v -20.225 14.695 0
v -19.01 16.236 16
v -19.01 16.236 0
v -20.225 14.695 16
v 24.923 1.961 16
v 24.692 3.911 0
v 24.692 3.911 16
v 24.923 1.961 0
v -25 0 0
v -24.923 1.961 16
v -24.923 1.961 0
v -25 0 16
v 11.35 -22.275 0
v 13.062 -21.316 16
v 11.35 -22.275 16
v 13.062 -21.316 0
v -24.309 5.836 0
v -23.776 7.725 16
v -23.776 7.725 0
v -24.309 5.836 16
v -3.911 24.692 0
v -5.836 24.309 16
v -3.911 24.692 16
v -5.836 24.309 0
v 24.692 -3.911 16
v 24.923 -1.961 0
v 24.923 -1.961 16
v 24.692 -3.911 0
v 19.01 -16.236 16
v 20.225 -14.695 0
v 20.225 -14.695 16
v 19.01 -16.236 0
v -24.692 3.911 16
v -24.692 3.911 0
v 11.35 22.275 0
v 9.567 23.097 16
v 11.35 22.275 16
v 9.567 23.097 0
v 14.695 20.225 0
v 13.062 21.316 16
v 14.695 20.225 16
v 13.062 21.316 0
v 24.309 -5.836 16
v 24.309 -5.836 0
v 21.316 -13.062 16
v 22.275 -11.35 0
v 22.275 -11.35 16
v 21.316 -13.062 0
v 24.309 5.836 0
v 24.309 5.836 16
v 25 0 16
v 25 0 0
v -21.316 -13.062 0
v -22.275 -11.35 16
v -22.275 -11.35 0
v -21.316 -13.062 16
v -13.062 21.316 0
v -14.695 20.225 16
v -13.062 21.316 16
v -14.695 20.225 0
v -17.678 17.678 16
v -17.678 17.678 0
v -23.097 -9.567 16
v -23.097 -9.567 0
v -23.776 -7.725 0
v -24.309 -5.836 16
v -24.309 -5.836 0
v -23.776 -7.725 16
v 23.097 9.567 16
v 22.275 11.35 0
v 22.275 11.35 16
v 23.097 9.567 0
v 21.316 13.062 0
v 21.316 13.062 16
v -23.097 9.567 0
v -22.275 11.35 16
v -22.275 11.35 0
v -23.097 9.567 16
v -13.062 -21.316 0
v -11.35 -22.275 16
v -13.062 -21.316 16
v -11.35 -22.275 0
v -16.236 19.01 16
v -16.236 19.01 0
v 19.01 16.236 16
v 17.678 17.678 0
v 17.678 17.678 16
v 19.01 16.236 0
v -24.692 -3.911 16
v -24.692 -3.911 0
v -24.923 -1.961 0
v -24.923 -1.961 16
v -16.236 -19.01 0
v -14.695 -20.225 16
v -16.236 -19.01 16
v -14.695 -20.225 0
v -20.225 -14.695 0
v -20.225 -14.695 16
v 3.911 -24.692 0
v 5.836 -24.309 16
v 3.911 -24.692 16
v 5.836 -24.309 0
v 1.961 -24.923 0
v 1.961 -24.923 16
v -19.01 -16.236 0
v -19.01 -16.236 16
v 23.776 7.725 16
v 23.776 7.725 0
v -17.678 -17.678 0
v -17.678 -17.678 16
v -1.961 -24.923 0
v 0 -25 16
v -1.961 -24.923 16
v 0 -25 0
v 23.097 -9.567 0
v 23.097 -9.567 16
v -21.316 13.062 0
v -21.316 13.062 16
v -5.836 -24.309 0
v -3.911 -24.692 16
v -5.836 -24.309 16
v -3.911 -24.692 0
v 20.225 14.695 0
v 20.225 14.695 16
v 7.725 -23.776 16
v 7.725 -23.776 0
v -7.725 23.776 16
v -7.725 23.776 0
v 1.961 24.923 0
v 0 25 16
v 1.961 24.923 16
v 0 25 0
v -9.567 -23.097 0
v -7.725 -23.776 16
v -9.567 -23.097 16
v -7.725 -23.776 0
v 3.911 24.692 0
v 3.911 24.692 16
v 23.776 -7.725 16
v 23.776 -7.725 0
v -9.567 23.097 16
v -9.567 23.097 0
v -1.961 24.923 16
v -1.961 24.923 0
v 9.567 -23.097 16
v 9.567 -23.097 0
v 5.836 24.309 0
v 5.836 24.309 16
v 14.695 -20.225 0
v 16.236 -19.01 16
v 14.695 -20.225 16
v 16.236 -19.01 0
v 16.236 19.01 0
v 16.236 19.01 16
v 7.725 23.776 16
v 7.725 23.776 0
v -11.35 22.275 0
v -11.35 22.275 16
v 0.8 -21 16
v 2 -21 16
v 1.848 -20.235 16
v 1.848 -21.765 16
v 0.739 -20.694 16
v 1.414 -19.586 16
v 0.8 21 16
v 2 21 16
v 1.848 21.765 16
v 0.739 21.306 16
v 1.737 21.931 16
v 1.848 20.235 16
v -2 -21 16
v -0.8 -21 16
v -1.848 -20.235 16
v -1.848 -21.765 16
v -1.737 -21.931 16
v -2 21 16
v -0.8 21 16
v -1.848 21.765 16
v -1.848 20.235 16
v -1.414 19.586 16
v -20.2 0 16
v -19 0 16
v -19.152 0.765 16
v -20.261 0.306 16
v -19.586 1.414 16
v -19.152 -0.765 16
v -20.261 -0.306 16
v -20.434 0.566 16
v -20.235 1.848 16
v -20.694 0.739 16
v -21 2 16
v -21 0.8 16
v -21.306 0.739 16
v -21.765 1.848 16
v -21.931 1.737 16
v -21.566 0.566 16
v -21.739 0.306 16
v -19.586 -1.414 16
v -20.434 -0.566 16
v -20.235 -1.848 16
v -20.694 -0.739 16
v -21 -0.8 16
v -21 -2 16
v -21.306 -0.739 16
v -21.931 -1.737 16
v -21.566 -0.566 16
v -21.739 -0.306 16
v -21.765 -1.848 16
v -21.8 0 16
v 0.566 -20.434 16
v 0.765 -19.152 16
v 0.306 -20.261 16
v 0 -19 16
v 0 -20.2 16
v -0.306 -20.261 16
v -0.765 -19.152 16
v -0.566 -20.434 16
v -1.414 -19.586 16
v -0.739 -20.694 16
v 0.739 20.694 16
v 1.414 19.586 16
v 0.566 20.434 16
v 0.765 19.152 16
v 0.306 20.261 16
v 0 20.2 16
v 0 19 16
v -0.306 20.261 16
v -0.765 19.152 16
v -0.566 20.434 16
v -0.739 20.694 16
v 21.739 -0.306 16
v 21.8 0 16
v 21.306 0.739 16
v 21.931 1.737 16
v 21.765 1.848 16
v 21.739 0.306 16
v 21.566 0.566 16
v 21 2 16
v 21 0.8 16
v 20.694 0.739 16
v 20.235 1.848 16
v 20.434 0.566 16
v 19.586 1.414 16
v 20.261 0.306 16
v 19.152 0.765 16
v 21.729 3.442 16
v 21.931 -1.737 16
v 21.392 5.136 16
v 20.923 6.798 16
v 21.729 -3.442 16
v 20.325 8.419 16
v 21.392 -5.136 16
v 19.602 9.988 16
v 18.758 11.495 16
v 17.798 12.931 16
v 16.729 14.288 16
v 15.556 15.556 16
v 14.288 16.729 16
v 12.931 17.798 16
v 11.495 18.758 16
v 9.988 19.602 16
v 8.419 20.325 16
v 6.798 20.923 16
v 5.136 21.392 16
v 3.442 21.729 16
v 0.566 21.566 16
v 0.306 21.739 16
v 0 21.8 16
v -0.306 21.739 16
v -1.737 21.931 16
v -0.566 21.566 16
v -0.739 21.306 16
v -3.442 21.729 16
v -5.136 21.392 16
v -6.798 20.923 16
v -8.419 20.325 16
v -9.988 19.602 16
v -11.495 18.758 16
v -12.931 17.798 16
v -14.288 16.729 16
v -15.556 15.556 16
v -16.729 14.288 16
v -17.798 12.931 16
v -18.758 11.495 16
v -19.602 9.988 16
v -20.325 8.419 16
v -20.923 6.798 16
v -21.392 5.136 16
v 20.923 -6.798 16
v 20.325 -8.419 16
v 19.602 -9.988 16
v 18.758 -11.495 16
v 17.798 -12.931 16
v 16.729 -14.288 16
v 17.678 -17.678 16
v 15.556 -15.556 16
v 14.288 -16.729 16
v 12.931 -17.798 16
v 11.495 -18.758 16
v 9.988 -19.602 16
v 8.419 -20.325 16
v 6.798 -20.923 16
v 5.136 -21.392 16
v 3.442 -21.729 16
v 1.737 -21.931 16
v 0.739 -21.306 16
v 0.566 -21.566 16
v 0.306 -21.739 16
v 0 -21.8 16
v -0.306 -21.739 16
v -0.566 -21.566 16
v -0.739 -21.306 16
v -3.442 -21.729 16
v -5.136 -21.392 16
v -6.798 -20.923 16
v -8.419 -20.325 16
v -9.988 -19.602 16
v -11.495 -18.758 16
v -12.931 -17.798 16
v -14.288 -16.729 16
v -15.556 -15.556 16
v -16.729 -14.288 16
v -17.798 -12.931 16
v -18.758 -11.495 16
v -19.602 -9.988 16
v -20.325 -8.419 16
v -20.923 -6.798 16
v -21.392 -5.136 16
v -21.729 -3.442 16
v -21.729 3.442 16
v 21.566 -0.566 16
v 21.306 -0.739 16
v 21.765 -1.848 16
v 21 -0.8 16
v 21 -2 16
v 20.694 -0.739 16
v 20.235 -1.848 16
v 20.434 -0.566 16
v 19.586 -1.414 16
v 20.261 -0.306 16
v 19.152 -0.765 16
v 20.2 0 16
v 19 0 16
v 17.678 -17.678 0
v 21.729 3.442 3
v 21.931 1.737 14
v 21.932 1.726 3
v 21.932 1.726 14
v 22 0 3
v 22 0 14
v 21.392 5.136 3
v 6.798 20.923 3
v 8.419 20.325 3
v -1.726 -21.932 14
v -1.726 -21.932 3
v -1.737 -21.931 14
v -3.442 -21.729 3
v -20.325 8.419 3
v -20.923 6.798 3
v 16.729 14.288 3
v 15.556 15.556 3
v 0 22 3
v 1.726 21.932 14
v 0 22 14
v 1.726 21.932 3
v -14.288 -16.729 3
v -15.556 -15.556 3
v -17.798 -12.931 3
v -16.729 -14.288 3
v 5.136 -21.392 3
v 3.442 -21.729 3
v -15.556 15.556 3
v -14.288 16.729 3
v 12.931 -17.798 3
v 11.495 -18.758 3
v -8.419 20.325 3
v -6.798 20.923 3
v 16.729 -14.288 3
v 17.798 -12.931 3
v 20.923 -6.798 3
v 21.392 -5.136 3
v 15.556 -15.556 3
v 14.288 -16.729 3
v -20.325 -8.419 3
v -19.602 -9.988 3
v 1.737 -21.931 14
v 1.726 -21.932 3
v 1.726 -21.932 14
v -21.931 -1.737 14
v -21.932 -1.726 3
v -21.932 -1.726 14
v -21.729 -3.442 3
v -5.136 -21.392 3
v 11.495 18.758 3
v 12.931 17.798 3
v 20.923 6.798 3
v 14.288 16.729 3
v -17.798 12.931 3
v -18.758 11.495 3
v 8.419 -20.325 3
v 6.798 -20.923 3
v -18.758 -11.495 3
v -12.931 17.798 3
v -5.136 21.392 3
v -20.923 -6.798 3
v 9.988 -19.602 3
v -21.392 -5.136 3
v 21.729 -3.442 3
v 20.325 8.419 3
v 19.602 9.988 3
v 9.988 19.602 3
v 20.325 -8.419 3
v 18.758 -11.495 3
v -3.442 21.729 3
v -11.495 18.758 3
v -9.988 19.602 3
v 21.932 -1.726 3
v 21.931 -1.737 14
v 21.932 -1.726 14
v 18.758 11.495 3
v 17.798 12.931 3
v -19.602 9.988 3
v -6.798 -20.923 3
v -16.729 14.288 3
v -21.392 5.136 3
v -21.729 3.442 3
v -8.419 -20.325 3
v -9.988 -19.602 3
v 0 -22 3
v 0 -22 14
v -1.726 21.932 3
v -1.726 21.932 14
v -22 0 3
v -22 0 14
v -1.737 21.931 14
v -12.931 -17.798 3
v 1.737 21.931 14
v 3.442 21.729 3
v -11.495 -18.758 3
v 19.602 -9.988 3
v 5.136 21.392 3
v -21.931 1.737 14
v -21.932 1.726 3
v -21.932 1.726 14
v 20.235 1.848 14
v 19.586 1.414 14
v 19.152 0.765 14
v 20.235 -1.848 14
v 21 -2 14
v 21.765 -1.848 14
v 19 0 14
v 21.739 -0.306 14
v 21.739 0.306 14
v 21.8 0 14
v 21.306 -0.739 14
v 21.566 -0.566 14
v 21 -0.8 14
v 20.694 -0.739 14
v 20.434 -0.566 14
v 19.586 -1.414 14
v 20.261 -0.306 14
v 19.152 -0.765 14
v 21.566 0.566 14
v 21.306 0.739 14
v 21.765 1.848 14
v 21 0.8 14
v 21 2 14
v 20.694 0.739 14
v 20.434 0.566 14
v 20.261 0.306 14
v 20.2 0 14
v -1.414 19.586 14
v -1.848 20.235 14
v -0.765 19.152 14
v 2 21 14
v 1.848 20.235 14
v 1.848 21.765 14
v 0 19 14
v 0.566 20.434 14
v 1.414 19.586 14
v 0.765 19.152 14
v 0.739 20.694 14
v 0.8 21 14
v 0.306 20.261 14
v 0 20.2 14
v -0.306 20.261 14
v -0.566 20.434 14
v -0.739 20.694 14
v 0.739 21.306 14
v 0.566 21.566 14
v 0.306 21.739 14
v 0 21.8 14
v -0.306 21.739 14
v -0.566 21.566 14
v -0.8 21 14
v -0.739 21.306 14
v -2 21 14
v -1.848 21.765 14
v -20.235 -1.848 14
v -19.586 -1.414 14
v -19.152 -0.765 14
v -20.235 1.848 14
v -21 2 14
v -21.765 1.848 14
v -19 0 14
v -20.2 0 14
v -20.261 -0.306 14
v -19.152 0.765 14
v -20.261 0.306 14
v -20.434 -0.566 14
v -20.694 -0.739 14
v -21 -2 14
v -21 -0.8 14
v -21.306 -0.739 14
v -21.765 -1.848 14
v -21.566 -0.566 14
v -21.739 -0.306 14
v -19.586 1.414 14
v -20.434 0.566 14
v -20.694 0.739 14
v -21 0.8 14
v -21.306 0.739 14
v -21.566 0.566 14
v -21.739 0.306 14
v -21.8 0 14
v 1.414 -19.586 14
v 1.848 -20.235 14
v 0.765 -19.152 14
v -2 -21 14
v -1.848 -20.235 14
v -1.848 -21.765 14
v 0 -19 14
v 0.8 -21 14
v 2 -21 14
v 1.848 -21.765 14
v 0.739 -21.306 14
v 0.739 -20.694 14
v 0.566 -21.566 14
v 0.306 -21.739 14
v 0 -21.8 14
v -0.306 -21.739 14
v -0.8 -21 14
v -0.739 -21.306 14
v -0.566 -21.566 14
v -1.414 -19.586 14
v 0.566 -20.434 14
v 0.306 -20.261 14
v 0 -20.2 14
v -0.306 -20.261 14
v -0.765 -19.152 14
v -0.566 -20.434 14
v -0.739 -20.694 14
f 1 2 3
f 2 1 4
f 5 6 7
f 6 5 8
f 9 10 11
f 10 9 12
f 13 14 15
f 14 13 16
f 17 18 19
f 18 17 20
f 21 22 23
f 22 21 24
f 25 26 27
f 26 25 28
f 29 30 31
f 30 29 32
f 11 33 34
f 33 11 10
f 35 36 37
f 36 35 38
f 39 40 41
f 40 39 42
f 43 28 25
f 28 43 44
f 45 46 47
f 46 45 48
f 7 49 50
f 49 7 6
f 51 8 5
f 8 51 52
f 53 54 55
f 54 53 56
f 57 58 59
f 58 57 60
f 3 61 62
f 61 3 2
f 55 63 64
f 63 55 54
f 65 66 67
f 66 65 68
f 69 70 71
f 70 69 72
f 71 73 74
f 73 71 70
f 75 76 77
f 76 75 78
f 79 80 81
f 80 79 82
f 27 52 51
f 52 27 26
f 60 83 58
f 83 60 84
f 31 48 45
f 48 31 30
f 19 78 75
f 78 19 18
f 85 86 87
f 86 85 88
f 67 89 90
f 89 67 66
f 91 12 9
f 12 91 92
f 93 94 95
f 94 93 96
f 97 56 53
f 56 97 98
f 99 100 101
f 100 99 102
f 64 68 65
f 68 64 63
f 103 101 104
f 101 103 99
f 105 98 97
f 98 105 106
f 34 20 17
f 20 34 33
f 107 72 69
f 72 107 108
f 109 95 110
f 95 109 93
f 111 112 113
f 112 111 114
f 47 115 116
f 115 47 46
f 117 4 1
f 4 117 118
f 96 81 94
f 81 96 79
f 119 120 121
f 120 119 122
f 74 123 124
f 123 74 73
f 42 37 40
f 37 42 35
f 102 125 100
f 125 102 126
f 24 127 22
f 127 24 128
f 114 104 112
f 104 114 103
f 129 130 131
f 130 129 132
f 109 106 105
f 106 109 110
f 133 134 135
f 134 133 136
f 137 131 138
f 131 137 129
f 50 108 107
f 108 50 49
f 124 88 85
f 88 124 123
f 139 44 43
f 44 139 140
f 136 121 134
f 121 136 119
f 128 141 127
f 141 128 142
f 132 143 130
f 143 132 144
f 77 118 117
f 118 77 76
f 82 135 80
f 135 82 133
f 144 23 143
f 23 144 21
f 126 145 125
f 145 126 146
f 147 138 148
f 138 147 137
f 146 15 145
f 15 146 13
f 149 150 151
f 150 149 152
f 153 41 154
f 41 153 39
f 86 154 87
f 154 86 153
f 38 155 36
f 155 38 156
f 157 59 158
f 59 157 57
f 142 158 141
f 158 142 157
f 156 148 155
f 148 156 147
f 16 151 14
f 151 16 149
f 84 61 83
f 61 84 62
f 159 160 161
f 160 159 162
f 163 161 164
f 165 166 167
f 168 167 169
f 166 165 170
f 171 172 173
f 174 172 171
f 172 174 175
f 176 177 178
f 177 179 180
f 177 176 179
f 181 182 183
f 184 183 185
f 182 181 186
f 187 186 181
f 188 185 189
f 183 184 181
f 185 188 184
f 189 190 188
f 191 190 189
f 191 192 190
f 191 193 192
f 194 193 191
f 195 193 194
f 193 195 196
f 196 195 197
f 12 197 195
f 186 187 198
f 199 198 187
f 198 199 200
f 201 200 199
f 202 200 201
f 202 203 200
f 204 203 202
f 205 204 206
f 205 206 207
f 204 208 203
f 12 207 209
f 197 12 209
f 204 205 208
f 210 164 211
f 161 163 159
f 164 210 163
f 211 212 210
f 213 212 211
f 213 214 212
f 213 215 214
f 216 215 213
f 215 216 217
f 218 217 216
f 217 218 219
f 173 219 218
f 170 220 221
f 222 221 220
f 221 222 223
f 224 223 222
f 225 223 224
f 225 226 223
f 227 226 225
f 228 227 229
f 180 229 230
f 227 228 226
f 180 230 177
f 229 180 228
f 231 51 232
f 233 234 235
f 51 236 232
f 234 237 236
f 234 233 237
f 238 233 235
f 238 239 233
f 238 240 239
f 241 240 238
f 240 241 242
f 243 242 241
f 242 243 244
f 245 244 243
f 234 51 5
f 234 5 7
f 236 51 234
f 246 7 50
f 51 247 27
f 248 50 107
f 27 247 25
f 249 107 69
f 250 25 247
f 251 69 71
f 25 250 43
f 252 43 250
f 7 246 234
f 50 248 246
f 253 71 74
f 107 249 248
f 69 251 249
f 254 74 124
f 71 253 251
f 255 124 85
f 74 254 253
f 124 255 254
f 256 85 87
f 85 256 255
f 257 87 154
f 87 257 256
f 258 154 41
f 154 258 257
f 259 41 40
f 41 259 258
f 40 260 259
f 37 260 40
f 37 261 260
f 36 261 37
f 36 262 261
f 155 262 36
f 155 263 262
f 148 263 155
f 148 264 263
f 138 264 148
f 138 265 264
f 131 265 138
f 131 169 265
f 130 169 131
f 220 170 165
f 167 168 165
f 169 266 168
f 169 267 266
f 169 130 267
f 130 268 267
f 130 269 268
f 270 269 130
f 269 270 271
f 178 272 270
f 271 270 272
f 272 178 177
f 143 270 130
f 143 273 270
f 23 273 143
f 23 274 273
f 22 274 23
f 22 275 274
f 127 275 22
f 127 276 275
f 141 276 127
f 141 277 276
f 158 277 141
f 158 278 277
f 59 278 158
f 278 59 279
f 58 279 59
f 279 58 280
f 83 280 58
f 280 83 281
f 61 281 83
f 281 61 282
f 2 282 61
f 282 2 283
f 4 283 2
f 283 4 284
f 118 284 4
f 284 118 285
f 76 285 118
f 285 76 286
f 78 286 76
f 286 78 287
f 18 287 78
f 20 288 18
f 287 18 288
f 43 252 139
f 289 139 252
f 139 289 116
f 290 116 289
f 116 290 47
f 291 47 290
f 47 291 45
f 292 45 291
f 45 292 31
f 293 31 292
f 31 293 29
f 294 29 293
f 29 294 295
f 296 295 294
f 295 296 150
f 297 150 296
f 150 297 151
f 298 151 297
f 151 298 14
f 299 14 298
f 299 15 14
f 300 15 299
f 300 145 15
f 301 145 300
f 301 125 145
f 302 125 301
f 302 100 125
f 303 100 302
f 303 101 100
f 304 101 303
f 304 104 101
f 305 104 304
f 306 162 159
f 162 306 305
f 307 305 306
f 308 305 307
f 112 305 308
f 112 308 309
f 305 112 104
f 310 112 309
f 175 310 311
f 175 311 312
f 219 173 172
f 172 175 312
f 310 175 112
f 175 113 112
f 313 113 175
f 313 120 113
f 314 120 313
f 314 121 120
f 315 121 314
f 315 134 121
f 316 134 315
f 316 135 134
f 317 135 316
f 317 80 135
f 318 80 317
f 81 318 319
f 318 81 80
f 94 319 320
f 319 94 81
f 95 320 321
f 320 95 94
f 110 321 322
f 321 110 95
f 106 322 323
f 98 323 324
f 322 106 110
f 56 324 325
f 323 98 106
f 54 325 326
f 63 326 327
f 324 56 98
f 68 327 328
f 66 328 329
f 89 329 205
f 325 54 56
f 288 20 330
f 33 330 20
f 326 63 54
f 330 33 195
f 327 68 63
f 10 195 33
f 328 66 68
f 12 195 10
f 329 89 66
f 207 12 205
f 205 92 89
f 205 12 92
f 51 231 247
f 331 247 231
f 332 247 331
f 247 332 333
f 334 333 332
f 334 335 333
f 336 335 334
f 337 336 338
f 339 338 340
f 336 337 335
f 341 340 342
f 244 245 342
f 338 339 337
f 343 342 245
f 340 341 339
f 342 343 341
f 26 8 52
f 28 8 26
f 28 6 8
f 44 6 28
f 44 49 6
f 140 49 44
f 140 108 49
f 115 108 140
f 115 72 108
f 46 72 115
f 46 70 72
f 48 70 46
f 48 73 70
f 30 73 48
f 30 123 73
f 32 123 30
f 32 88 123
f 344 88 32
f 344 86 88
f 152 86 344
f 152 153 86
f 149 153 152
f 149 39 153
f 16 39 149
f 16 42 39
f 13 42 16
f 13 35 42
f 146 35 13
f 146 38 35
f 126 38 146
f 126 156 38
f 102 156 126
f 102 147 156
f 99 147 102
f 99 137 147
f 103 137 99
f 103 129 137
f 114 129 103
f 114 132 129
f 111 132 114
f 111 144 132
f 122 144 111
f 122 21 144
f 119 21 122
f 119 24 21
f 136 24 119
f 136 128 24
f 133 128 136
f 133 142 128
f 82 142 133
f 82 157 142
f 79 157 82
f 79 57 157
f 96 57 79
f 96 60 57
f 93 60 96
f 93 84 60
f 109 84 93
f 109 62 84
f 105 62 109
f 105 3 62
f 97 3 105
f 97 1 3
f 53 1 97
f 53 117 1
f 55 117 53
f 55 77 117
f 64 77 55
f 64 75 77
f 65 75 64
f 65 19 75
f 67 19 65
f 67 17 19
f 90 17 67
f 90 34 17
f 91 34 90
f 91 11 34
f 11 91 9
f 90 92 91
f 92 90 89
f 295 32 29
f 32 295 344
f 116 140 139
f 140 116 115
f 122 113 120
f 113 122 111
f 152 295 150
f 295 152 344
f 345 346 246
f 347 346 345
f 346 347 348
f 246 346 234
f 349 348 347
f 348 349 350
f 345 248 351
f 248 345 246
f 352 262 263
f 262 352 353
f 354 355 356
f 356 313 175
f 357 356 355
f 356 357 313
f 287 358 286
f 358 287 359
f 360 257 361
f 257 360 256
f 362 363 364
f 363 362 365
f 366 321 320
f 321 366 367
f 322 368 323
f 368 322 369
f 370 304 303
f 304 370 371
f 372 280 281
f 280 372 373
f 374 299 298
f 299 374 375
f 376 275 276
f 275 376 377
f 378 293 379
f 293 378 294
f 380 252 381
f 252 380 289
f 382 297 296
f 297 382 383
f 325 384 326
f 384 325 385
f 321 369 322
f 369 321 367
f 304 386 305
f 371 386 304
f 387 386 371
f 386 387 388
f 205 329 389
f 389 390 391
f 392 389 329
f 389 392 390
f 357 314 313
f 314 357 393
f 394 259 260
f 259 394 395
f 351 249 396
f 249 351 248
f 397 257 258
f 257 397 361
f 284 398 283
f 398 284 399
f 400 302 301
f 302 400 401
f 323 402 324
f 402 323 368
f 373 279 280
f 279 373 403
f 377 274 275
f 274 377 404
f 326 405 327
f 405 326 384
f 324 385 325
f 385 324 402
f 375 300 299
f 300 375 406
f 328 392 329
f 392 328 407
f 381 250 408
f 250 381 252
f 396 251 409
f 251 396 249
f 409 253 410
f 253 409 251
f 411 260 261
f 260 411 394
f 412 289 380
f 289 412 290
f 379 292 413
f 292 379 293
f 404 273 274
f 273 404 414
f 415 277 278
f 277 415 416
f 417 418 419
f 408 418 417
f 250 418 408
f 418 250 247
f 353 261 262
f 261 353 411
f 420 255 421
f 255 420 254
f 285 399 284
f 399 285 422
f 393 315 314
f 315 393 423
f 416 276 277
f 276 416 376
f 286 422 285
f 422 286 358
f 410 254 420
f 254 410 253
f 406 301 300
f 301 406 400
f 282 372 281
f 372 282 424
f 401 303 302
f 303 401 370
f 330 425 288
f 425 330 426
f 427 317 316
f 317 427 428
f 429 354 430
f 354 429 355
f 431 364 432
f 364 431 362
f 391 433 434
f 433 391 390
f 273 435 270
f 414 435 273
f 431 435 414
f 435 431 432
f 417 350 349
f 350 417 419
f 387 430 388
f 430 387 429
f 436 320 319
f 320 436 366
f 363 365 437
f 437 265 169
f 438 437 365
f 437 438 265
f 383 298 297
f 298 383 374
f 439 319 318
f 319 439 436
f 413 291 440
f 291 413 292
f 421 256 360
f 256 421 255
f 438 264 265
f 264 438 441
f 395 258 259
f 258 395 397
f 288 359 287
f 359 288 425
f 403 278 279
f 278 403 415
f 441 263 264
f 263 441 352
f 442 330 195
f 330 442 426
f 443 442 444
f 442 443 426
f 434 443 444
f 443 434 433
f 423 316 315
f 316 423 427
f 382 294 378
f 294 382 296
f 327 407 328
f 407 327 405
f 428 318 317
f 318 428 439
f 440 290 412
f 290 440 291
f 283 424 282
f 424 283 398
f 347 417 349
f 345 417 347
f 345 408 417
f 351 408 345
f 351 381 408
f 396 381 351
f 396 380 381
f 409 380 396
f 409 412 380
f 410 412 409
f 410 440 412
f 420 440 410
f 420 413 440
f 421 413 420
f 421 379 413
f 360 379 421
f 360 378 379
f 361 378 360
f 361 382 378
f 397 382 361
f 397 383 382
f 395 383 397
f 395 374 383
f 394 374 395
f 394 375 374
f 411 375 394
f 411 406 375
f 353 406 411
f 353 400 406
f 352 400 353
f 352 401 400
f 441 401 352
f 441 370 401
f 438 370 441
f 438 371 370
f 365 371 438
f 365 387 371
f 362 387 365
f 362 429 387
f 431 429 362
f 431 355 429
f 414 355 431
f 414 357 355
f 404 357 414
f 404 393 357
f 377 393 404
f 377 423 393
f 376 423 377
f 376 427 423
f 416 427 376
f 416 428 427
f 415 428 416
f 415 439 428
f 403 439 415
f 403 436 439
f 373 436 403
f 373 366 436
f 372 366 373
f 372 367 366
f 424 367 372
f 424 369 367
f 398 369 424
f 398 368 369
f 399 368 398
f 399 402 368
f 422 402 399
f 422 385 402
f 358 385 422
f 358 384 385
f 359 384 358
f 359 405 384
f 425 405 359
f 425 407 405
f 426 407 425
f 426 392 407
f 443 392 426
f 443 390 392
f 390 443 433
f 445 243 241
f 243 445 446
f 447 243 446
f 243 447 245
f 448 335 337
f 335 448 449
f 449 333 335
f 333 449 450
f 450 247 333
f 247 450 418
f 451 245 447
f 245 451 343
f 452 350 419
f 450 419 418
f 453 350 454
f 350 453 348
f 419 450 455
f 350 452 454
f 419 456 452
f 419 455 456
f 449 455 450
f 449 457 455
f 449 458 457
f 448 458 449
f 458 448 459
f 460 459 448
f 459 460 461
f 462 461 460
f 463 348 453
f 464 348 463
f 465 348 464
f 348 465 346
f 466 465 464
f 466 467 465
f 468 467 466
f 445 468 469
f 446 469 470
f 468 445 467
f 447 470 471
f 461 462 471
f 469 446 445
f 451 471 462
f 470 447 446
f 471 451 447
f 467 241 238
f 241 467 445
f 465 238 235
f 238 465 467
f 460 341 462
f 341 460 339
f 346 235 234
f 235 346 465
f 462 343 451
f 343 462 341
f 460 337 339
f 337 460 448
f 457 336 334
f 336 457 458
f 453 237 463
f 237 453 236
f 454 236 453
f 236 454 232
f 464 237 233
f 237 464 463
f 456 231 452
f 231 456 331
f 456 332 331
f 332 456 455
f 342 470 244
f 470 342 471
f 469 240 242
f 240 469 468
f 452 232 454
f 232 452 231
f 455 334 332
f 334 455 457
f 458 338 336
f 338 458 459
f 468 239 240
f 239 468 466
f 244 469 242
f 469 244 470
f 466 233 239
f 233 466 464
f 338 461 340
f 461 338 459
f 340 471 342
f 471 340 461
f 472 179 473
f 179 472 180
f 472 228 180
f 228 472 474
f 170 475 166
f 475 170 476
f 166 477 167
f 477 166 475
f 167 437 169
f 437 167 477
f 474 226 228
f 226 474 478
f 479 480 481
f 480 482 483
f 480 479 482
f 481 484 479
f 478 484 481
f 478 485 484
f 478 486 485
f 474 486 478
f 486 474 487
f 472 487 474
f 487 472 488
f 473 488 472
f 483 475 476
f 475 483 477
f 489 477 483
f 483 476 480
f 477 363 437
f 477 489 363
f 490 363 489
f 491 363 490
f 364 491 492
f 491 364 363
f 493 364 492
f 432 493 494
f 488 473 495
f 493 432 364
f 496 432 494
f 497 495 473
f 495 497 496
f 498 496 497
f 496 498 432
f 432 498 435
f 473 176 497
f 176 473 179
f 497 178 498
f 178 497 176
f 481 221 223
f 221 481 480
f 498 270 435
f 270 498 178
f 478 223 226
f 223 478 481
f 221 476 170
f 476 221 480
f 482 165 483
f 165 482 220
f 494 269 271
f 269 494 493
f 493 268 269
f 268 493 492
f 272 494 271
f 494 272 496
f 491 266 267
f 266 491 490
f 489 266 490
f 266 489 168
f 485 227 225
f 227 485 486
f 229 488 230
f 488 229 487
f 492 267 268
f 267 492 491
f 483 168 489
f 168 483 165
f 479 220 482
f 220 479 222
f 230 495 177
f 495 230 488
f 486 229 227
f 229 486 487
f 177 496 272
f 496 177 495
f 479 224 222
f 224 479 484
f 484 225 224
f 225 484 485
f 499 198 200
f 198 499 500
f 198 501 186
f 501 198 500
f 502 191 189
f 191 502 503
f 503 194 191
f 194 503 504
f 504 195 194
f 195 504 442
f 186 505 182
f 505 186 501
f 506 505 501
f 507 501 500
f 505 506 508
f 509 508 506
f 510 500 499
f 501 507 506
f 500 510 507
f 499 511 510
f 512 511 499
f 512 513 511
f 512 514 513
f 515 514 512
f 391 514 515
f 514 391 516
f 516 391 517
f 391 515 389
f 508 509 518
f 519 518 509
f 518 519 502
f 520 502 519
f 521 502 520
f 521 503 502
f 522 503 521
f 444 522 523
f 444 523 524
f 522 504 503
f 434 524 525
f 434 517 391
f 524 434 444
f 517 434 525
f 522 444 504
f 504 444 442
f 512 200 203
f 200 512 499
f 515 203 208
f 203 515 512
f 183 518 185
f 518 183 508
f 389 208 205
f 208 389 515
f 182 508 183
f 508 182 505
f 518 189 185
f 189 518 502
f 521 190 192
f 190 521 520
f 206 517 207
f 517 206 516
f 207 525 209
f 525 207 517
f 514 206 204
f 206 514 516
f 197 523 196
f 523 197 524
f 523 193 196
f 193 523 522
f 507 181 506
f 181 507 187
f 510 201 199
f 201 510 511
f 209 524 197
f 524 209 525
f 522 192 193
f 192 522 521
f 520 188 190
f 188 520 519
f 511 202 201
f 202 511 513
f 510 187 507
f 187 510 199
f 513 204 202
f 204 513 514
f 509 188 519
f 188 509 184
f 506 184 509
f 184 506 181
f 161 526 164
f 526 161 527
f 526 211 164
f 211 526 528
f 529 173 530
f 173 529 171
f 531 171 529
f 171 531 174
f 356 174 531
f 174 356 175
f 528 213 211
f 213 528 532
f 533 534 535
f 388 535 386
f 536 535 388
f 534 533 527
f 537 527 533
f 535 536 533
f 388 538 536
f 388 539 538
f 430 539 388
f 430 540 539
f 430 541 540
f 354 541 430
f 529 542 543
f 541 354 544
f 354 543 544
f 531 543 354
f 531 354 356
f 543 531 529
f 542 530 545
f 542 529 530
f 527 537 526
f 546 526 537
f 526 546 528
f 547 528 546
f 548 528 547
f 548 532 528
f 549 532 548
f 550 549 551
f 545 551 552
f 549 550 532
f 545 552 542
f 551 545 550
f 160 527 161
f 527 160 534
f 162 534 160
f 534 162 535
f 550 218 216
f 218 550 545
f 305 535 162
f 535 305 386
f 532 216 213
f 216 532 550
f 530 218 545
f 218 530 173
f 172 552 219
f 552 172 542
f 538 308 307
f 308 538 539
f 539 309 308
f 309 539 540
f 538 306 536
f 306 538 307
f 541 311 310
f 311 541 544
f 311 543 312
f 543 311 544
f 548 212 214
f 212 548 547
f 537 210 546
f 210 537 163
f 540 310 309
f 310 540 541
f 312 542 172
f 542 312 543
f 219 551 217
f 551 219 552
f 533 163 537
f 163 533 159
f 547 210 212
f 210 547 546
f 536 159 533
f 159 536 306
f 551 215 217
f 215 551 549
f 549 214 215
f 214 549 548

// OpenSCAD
// ============================================================
// Orb V2 — 声学共振腔
// 提升 40mm 扬声器低频响应
// ============================================================

// --- 参数 ---
chamber_outer_r = 25;    // 腔体外径 50mm → 半径 25mm
chamber_inner_r = 22;    // 腔体内径
chamber_height  = 16;    // 腔体高度
wall_thick      = 3;     // 壁厚（声学需要较厚壁）
speaker_r       = 20;    // 扬声器安装孔半径 40mm → 20mm
speaker_mount_r = 21;    // 扬声器卡位半径

module speaker_chamber() {
    difference() {
        // 腔体外壁
        cylinder(h = chamber_height, r = chamber_outer_r, $fn = 80);

        // 内腔（共振空间）
        translate([0, 0, wall_thick])
            cylinder(h = chamber_height - wall_thick + 0.1, r = chamber_inner_r, $fn = 80);

        // 扬声器安装孔（顶部）
        translate([0, 0, chamber_height - 2])
            cylinder(h = 3, r = speaker_r, $fn = 80);
    }

    // 扬声器卡扣凸台（4 点固定）
    for (i = [0 : 90 : 270]) {
        rotate([0, 0, i])
            translate([speaker_mount_r, 0, chamber_height - 2])
                difference() {
                    cylinder(h = 2, r = 2, $fn = 16);
                    cylinder(h = 2.1, r = 0.8, $fn = 16);
                }
    }
}

speaker_chamber();
